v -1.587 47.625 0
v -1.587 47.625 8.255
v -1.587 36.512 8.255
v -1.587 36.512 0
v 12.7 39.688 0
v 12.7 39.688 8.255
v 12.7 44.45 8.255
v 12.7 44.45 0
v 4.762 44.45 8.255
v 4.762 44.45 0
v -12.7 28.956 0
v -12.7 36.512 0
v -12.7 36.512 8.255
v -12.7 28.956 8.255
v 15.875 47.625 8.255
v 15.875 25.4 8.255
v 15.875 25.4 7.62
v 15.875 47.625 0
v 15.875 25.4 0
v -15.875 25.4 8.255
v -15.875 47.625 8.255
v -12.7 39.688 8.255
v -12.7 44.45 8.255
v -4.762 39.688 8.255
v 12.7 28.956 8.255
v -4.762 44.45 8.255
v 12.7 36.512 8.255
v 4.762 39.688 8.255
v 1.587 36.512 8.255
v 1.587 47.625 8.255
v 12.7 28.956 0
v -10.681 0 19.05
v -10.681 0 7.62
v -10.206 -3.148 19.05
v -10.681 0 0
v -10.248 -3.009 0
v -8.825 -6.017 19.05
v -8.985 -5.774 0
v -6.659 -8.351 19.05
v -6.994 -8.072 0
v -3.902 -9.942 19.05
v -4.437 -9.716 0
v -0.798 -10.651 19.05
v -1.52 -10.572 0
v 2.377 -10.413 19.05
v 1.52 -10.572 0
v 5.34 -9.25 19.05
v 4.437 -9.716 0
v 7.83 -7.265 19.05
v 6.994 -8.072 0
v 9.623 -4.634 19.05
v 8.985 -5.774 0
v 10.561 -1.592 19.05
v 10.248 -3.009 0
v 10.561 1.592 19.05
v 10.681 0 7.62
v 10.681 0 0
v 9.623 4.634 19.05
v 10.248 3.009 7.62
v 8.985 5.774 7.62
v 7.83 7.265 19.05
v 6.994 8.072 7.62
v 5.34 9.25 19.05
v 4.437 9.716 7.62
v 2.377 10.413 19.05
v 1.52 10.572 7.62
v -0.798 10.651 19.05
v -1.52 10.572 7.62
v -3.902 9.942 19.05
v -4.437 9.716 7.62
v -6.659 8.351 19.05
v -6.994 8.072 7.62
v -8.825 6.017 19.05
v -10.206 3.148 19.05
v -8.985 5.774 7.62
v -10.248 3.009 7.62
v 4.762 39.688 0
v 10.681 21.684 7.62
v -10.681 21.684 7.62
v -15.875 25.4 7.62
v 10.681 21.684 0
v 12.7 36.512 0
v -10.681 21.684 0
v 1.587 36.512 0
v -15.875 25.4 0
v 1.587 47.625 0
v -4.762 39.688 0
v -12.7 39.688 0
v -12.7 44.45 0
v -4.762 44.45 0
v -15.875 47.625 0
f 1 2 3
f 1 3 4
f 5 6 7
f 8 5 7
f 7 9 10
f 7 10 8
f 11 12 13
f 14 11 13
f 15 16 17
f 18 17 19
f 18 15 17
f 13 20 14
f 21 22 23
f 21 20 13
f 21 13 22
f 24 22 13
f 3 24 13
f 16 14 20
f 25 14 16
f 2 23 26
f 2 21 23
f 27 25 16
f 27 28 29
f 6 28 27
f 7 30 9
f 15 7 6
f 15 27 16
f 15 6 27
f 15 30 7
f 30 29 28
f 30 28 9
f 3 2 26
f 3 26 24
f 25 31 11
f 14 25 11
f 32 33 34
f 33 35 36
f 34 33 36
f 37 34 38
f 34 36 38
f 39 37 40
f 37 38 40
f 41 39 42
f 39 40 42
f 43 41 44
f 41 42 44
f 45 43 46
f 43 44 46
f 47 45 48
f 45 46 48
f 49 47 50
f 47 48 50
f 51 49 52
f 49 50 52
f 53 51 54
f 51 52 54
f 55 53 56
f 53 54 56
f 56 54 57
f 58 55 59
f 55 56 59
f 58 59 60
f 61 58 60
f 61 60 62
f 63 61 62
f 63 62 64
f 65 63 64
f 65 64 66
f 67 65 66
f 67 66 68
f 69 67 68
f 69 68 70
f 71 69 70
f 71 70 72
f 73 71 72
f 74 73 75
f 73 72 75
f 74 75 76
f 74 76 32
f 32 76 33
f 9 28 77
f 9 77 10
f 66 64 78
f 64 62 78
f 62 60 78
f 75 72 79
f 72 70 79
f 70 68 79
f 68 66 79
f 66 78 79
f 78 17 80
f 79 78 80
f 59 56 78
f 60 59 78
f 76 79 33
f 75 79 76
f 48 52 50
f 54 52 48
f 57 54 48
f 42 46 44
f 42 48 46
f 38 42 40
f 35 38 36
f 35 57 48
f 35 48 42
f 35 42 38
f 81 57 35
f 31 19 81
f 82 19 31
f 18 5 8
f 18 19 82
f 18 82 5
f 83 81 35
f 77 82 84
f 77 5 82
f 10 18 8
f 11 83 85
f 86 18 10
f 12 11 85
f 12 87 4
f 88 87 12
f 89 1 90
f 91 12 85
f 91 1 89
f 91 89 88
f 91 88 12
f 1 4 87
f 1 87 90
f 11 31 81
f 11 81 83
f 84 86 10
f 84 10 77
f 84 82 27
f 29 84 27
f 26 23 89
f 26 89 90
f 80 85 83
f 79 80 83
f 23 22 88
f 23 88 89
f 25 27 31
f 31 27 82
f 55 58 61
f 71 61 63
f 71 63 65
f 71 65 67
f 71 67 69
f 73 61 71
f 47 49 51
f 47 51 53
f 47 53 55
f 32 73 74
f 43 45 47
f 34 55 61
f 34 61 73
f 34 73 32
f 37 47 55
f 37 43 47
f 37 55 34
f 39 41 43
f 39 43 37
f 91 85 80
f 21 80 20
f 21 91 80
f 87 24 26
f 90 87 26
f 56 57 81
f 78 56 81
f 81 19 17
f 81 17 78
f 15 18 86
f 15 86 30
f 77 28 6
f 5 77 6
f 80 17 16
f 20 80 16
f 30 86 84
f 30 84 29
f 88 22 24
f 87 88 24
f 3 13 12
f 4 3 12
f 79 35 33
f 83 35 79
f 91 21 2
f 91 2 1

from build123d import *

# Parameters (mm, degrees)
SKETCH1_R           = 10.6807
BOSS_EXTRUDE1_DEPTH = 19.05
SKETCH2_W           = 21.3614
SKETCH2_H           = 25.4
BOSS_EXTRUDE2_DEPTH = 7.62
BOSS_EXTRUDE3_DEPTH = 3.556
SKETCH4_W           = 15.875
SKETCH4_H           = 22.225
BOSS_EXTRUDE4_DEPTH = 3.175
SKETCH5_W           = 15.875
SKETCH5_H           = 22.225
BOSS_EXTRUDE5_DEPTH = 3.175
SKETCH7_W           = 15.875
SKETCH7_H           = 11.1125
BOSS_EXTRUDE6_DEPTH = 11.1125
SKETCH8_W           = 15.875
SKETCH8_H           = 11.1125
BOSS_EXTRUDE7_DEPTH = 11.1125
SKETCH9_W           = 31.75
SKETCH9_H           = 22.225
CUT_EXTRUDE1_DEPTH  = 7.62
BOSS_EXTRUDE8_DEPTH = 7.62
CUT_EXTRUDE2_REACH  = 53.349
SKETCH11_W          = 7.9375
SKETCH11_H          = 4.7625


with BuildPart() as part:
    # Sketch1 → Boss-Extrude1 (new body)
    with BuildSketch(Plane.XY):
        with Locations(Location((0, 0, 0), (0, 0, 180))):
            Circle(SKETCH1_R)
    extrude(amount=BOSS_EXTRUDE1_DEPTH)

    # Sketch2 → Boss-Extrude2 (add)
    with BuildSketch(Plane(origin=(0, 0, 0), x_dir=(-1, 0, 0), z_dir=(0, 0, -1))):
        with Locations((0, 12.7)):
            Rectangle(SKETCH2_W, SKETCH2_H)
    extrude(amount=-BOSS_EXTRUDE2_DEPTH)

    # Sketch3 → Boss-Extrude3 (add)
    with BuildSketch(Plane(origin=(0, 25.4, 0), x_dir=(1, 0, 0), z_dir=(0, 1, 0))):
        Polygon((0, 0), (12.7, 0), (12.7, -15.875), (-12.7, -15.875), (-12.7, 0), align=None)
    extrude(amount=BOSS_EXTRUDE3_DEPTH)

    # Sketch4 → Boss-Extrude4 (add)
    with BuildSketch(Plane(origin=(12.7, 0, 0), x_dir=(0, 0, -1), z_dir=(1, 0, 0))):
        with Locations((-7.9375, 36.5125)):
            Rectangle(SKETCH4_W, SKETCH4_H)
    extrude(amount=BOSS_EXTRUDE4_DEPTH)

    # Sketch5 → Boss-Extrude5 (add)
    with BuildSketch(Plane.ZY.offset(12.7)):
        with Locations((7.9375, 36.5125)):
            Rectangle(SKETCH5_W, SKETCH5_H)
    extrude(amount=BOSS_EXTRUDE5_DEPTH)

    # Sketch7 → Boss-Extrude6 (add)
    with BuildSketch(Plane(origin=(-12.7, 0, 0), x_dir=(0, 0, -1), z_dir=(1, 0, 0))):
        with Locations((-7.9375, 42.06875)):
            Rectangle(SKETCH7_W, SKETCH7_H)
    extrude(amount=BOSS_EXTRUDE6_DEPTH)

    # Sketch8 → Boss-Extrude7 (add)
    with BuildSketch(Plane.ZY.offset(-12.7)):
        with Locations((7.9375, 42.06875)):
            Rectangle(SKETCH8_W, SKETCH8_H)
    extrude(amount=BOSS_EXTRUDE7_DEPTH)

    # Sketch9 → Cut-Extrude1 (cut)
    with BuildSketch(Plane.XY.offset(15.875)):
        with Locations((0, 36.5125)):
            Rectangle(SKETCH9_W, SKETCH9_H)
    extrude(amount=-CUT_EXTRUDE1_DEPTH, mode=Mode.SUBTRACT)

    # Sketch10 → Boss-Extrude8 (add)
    with BuildSketch(Plane(origin=(0, 0, 0), x_dir=(-1, 0, 0), z_dir=(0, 0, -1))):
        Polygon((-10.6807, 25.4), (-15.875, 25.4), (-10.6807, 21.684330036), align=None)
        Polygon((15.875, 25.4), (10.6807, 21.684330036), (10.6807, 25.4), align=None)
    extrude(amount=-BOSS_EXTRUDE8_DEPTH)

    # Sketch11 → Cut-Extrude2 (cut, up to next)
    with BuildSketch(Plane.XY.offset(8.255), mode=Mode.PRIVATE) as cut_extrude2_sk1:
        with Locations((8.73125, 42.06875)):
            Rectangle(SKETCH11_W, SKETCH11_H)
    cut_extrude2_tool1 = extrude(cut_extrude2_sk1.sketch, amount=-CUT_EXTRUDE2_REACH, mode=Mode.PRIVATE) & part.part
    # Sketch11 → Cut-Extrude2 (cut, up to next)
    with BuildSketch(Plane.XY.offset(8.255), mode=Mode.PRIVATE) as cut_extrude2_sk2:
        with Locations((-8.73125, 42.06875)):
            Rectangle(SKETCH11_W, SKETCH11_H)
    cut_extrude2_tool2 = extrude(cut_extrude2_sk2.sketch, amount=-CUT_EXTRUDE2_REACH, mode=Mode.PRIVATE) & part.part
    add(cut_extrude2_tool1.solids().sort_by_distance((8.73125, 42.06875, 8.255))[0], mode=Mode.SUBTRACT)
    add(cut_extrude2_tool2.solids().sort_by_distance((-8.73125, 42.06875, 8.255))[0], mode=Mode.SUBTRACT)


solid = part.part
